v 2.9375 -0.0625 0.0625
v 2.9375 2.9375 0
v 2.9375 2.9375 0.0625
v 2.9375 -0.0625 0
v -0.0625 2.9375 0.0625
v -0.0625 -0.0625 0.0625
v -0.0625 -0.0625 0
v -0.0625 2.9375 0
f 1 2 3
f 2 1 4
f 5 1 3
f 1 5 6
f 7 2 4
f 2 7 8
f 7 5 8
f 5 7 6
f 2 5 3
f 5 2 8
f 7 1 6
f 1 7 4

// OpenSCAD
// element11.scad
// Curved conveyor belt — quarter-circle turn
// Belt arc with radial green rollers and a hollow curved direction arrow.
// Arc center at top-right corner; belt sweeps lower-left quadrant (180°–270°).
// Belt enters from bottom-right and exits upward at the left.
// Units: inches

plate_w = 2 + 7/8;
plate_d = 2 + 7/8;
plate_h = 1/16;
frame_w = 1/16;

hole_d = 3/32;
hole_r = hole_d / 2;

// Belt arc — center at top-right corner, sweeps lower-left quadrant
arc_cx    = plate_w;
arc_cy    = plate_d;
arc_r_out = 2.80;    // outer radius of belt arc (reaches near tile edges)
arc_r_in  = 1.00;    // inner radius (leaves bare-plate corner at top-right)
arc_a1    = 180;     // left end — belt exits upward here (arrowhead end)
arc_a2    = 270;     // bottom end — belt enters here

// Curved rollers — radially oriented, 8 along arc midline
roller_count = 8;
roller_r_mid = arc_r_in + (arc_r_out - arc_r_in) * 0.47;  // ~1.80"
roller_len   = (arc_r_out - arc_r_in) * 0.62;             // ~1.12" radial length
roller_r_cap = 0.09;                                       // stadium end-cap radius

// Hollow curved arrow — yellow-green outline
arrow_r_mid  = arc_r_in + (arc_r_out - arc_r_in) * 0.38;  // ~1.62"
arrow_half_w = (arc_r_out - arc_r_in) * 0.26;             // ~0.49" half-width
arrow_stroke = 0.10;                                       // outline thickness
arrow_a1     = arc_a1 + 6;   // arrowhead angle (just inside arc edge)
arrow_a2     = arc_a2 - 6;   // tail angle
arrow_head_h = 0.32;
arrow_head_w = 0.52;

// ── Helpers ──────────────────────────────────────────────────────────────────

// Pie-slice fan for sector clipping
module fan_2d(r, a1, a2) {
    polygon(concat([[0, 0]], [for (a = [a1:1:a2]) [r * cos(a), r * sin(a)]]));
}

// Annular sector from angle a1 to a2 (counterclockwise, both inclusive)
module annular_sector_2d(r_outer, r_inner, a1, a2) {
    intersection() {
        difference() {
            circle(r = r_outer, $fn = 120);
            circle(r = r_inner, $fn = 120);
        }
        fan_2d(r_outer + 0.5, a1, a2);
    }
}

// ── Standard modules ─────────────────────────────────────────────────────────

module rivet_holes() {
    spacing_x = plate_w / 10;
    spacing_y = plate_d / 10;
    inset_x   = spacing_x / 2;
    inset_y   = spacing_y / 2;
    // Front edge
    for (i = [0:9])
        translate([inset_x + i * spacing_x, inset_y,         -1])
            cylinder(h = plate_h + 2, r = hole_r, $fn = 20);
    // Back edge
    for (i = [0:9])
        translate([inset_x + i * spacing_x, plate_d - inset_y, -1])
            cylinder(h = plate_h + 2, r = hole_r, $fn = 20);
    // Left edge
    for (i = [0:9])
        translate([inset_x,           inset_y + i * spacing_y, -1])
            cylinder(h = plate_h + 2, r = hole_r, $fn = 20);
    // Right edge
    for (i = [0:9])
        translate([plate_w - inset_x, inset_y + i * spacing_y, -1])
            cylinder(h = plate_h + 2, r = hole_r, $fn = 20);
}

module frame() {
    color("black")
    difference() {
        translate([-frame_w, -frame_w, 0])
            cube([plate_w + 2 * frame_w, plate_d + 2 * frame_w, plate_h]);
        translate([0, 0, -0.001])
            cube([plate_w, plate_d, plate_h + 0.002]);
    }
}

module belt_arc_cutout() {
    translate([0, 0, -0.001])
    linear_extrude(plate_h + 0.002)
    translate([arc_cx, arc_cy])
        annular_sector_2d(arc_r_out, arc_r_in, arc_a1, arc_a2);
}

module plate() {
    difference() {
        color("darkgray")
            cube([plate_w, plate_d, plate_h]);
        rivet_holes();
        belt_arc_cutout();
    }
}

rivet_h = plate_h;
module rivets() {
    spacing_x = plate_w / 10;
    spacing_y = plate_d / 10;
    inset_x   = spacing_x / 2;
    inset_y   = spacing_y / 2;
    color("lightgray") {
        for (i = [0:9])
            translate([inset_x + i * spacing_x, inset_y,         0])
                cylinder(h = rivet_h, r = hole_r, $fn = 20);
        for (i = [0:9])
            translate([inset_x + i * spacing_x, plate_d - inset_y, 0])
                cylinder(h = rivet_h, r = hole_r, $fn = 20);
        for (i = [0:9])
            translate([inset_x,           inset_y + i * spacing_y, 0])
                cylinder(h = rivet_h, r = hole_r, $fn = 20);
        for (i = [0:9])
            translate([plate_w - inset_x, inset_y + i * spacing_y, 0])
                cylinder(h = rivet_h, r = hole_r, $fn = 20);
    }
}

// ── Feature modules ──────────────────────────────────────────────────────────

// Black belt surface filling the arc cutout
module belt_arc() {
    color("black")
    intersection() {
        linear_extrude(plate_h)
        translate([arc_cx, arc_cy])
            annular_sector_2d(arc_r_out, arc_r_in, arc_a1, arc_a2);
        cube([plate_w, plate_d, plate_h]);
    }
}

// Green radial roller slots — stadium shapes oriented toward arc center
module curved_rollers() {
    span = arc_a2 - arc_a1 - 10;   // exclude 5° at each arc end
    color("green")
    for (i = [0:roller_count - 1]) {
        theta = arc_a1 + 5 + span * i / (roller_count - 1);
        cx = arc_cx + roller_r_mid * cos(theta);
        cy = arc_cy + roller_r_mid * sin(theta);
        translate([cx, cy, 0])
        rotate([0, 0, theta])   // align long axis with radial direction
        hull() {
            translate([-roller_len / 2, 0, 0])
                cylinder(h = plate_h, r = roller_r_cap, $fn = 20);
            translate([ roller_len / 2, 0, 0])
                cylinder(h = plate_h, r = roller_r_cap, $fn = 20);
        }
    }
}

// Yellow-green hollow curved arrow showing belt direction
// Arrowhead at arrow_a1 (exit end), pointing clockwise-tangent ≈ upward.
// Rotation formula: rotate([0,0, theta - 180]) aligns +y tip to clockwise tangent at theta.
module curved_arrow() {
    r_o = arrow_r_mid + arrow_half_w;
    r_i = arrow_r_mid - arrow_half_w;

    color([0.40, 1.00, 0.10])   // bright yellow-green
    linear_extrude(plate_h + 0.001)
    translate([arc_cx, arc_cy])
    union() {
        // Hollow arc body — outer stroke + inner stroke, open interior
        difference() {
            annular_sector_2d(r_o,               r_i,               arrow_a1, arrow_a2);
            annular_sector_2d(r_o - arrow_stroke, r_i + arrow_stroke, arrow_a1, arrow_a2);
        }

        // Arrowhead triangle at arrow_a1 (exit / upward end)
        translate([arrow_r_mid * cos(arrow_a1), arrow_r_mid * sin(arrow_a1)])
        rotate([0, 0, arrow_a1 - 180])   // clockwise tangent direction
        polygon([
            [ 0,               arrow_head_h],   // tip
            [-arrow_head_w / 2, 0],             // base left
            [ arrow_head_w / 2, 0],             // base right
        ]);
    }
}

// ── Assembly ─────────────────────────────────────────────────────────────────

frame();
plate();
rivets();
belt_arc();
curved_rollers();
curved_arrow();
